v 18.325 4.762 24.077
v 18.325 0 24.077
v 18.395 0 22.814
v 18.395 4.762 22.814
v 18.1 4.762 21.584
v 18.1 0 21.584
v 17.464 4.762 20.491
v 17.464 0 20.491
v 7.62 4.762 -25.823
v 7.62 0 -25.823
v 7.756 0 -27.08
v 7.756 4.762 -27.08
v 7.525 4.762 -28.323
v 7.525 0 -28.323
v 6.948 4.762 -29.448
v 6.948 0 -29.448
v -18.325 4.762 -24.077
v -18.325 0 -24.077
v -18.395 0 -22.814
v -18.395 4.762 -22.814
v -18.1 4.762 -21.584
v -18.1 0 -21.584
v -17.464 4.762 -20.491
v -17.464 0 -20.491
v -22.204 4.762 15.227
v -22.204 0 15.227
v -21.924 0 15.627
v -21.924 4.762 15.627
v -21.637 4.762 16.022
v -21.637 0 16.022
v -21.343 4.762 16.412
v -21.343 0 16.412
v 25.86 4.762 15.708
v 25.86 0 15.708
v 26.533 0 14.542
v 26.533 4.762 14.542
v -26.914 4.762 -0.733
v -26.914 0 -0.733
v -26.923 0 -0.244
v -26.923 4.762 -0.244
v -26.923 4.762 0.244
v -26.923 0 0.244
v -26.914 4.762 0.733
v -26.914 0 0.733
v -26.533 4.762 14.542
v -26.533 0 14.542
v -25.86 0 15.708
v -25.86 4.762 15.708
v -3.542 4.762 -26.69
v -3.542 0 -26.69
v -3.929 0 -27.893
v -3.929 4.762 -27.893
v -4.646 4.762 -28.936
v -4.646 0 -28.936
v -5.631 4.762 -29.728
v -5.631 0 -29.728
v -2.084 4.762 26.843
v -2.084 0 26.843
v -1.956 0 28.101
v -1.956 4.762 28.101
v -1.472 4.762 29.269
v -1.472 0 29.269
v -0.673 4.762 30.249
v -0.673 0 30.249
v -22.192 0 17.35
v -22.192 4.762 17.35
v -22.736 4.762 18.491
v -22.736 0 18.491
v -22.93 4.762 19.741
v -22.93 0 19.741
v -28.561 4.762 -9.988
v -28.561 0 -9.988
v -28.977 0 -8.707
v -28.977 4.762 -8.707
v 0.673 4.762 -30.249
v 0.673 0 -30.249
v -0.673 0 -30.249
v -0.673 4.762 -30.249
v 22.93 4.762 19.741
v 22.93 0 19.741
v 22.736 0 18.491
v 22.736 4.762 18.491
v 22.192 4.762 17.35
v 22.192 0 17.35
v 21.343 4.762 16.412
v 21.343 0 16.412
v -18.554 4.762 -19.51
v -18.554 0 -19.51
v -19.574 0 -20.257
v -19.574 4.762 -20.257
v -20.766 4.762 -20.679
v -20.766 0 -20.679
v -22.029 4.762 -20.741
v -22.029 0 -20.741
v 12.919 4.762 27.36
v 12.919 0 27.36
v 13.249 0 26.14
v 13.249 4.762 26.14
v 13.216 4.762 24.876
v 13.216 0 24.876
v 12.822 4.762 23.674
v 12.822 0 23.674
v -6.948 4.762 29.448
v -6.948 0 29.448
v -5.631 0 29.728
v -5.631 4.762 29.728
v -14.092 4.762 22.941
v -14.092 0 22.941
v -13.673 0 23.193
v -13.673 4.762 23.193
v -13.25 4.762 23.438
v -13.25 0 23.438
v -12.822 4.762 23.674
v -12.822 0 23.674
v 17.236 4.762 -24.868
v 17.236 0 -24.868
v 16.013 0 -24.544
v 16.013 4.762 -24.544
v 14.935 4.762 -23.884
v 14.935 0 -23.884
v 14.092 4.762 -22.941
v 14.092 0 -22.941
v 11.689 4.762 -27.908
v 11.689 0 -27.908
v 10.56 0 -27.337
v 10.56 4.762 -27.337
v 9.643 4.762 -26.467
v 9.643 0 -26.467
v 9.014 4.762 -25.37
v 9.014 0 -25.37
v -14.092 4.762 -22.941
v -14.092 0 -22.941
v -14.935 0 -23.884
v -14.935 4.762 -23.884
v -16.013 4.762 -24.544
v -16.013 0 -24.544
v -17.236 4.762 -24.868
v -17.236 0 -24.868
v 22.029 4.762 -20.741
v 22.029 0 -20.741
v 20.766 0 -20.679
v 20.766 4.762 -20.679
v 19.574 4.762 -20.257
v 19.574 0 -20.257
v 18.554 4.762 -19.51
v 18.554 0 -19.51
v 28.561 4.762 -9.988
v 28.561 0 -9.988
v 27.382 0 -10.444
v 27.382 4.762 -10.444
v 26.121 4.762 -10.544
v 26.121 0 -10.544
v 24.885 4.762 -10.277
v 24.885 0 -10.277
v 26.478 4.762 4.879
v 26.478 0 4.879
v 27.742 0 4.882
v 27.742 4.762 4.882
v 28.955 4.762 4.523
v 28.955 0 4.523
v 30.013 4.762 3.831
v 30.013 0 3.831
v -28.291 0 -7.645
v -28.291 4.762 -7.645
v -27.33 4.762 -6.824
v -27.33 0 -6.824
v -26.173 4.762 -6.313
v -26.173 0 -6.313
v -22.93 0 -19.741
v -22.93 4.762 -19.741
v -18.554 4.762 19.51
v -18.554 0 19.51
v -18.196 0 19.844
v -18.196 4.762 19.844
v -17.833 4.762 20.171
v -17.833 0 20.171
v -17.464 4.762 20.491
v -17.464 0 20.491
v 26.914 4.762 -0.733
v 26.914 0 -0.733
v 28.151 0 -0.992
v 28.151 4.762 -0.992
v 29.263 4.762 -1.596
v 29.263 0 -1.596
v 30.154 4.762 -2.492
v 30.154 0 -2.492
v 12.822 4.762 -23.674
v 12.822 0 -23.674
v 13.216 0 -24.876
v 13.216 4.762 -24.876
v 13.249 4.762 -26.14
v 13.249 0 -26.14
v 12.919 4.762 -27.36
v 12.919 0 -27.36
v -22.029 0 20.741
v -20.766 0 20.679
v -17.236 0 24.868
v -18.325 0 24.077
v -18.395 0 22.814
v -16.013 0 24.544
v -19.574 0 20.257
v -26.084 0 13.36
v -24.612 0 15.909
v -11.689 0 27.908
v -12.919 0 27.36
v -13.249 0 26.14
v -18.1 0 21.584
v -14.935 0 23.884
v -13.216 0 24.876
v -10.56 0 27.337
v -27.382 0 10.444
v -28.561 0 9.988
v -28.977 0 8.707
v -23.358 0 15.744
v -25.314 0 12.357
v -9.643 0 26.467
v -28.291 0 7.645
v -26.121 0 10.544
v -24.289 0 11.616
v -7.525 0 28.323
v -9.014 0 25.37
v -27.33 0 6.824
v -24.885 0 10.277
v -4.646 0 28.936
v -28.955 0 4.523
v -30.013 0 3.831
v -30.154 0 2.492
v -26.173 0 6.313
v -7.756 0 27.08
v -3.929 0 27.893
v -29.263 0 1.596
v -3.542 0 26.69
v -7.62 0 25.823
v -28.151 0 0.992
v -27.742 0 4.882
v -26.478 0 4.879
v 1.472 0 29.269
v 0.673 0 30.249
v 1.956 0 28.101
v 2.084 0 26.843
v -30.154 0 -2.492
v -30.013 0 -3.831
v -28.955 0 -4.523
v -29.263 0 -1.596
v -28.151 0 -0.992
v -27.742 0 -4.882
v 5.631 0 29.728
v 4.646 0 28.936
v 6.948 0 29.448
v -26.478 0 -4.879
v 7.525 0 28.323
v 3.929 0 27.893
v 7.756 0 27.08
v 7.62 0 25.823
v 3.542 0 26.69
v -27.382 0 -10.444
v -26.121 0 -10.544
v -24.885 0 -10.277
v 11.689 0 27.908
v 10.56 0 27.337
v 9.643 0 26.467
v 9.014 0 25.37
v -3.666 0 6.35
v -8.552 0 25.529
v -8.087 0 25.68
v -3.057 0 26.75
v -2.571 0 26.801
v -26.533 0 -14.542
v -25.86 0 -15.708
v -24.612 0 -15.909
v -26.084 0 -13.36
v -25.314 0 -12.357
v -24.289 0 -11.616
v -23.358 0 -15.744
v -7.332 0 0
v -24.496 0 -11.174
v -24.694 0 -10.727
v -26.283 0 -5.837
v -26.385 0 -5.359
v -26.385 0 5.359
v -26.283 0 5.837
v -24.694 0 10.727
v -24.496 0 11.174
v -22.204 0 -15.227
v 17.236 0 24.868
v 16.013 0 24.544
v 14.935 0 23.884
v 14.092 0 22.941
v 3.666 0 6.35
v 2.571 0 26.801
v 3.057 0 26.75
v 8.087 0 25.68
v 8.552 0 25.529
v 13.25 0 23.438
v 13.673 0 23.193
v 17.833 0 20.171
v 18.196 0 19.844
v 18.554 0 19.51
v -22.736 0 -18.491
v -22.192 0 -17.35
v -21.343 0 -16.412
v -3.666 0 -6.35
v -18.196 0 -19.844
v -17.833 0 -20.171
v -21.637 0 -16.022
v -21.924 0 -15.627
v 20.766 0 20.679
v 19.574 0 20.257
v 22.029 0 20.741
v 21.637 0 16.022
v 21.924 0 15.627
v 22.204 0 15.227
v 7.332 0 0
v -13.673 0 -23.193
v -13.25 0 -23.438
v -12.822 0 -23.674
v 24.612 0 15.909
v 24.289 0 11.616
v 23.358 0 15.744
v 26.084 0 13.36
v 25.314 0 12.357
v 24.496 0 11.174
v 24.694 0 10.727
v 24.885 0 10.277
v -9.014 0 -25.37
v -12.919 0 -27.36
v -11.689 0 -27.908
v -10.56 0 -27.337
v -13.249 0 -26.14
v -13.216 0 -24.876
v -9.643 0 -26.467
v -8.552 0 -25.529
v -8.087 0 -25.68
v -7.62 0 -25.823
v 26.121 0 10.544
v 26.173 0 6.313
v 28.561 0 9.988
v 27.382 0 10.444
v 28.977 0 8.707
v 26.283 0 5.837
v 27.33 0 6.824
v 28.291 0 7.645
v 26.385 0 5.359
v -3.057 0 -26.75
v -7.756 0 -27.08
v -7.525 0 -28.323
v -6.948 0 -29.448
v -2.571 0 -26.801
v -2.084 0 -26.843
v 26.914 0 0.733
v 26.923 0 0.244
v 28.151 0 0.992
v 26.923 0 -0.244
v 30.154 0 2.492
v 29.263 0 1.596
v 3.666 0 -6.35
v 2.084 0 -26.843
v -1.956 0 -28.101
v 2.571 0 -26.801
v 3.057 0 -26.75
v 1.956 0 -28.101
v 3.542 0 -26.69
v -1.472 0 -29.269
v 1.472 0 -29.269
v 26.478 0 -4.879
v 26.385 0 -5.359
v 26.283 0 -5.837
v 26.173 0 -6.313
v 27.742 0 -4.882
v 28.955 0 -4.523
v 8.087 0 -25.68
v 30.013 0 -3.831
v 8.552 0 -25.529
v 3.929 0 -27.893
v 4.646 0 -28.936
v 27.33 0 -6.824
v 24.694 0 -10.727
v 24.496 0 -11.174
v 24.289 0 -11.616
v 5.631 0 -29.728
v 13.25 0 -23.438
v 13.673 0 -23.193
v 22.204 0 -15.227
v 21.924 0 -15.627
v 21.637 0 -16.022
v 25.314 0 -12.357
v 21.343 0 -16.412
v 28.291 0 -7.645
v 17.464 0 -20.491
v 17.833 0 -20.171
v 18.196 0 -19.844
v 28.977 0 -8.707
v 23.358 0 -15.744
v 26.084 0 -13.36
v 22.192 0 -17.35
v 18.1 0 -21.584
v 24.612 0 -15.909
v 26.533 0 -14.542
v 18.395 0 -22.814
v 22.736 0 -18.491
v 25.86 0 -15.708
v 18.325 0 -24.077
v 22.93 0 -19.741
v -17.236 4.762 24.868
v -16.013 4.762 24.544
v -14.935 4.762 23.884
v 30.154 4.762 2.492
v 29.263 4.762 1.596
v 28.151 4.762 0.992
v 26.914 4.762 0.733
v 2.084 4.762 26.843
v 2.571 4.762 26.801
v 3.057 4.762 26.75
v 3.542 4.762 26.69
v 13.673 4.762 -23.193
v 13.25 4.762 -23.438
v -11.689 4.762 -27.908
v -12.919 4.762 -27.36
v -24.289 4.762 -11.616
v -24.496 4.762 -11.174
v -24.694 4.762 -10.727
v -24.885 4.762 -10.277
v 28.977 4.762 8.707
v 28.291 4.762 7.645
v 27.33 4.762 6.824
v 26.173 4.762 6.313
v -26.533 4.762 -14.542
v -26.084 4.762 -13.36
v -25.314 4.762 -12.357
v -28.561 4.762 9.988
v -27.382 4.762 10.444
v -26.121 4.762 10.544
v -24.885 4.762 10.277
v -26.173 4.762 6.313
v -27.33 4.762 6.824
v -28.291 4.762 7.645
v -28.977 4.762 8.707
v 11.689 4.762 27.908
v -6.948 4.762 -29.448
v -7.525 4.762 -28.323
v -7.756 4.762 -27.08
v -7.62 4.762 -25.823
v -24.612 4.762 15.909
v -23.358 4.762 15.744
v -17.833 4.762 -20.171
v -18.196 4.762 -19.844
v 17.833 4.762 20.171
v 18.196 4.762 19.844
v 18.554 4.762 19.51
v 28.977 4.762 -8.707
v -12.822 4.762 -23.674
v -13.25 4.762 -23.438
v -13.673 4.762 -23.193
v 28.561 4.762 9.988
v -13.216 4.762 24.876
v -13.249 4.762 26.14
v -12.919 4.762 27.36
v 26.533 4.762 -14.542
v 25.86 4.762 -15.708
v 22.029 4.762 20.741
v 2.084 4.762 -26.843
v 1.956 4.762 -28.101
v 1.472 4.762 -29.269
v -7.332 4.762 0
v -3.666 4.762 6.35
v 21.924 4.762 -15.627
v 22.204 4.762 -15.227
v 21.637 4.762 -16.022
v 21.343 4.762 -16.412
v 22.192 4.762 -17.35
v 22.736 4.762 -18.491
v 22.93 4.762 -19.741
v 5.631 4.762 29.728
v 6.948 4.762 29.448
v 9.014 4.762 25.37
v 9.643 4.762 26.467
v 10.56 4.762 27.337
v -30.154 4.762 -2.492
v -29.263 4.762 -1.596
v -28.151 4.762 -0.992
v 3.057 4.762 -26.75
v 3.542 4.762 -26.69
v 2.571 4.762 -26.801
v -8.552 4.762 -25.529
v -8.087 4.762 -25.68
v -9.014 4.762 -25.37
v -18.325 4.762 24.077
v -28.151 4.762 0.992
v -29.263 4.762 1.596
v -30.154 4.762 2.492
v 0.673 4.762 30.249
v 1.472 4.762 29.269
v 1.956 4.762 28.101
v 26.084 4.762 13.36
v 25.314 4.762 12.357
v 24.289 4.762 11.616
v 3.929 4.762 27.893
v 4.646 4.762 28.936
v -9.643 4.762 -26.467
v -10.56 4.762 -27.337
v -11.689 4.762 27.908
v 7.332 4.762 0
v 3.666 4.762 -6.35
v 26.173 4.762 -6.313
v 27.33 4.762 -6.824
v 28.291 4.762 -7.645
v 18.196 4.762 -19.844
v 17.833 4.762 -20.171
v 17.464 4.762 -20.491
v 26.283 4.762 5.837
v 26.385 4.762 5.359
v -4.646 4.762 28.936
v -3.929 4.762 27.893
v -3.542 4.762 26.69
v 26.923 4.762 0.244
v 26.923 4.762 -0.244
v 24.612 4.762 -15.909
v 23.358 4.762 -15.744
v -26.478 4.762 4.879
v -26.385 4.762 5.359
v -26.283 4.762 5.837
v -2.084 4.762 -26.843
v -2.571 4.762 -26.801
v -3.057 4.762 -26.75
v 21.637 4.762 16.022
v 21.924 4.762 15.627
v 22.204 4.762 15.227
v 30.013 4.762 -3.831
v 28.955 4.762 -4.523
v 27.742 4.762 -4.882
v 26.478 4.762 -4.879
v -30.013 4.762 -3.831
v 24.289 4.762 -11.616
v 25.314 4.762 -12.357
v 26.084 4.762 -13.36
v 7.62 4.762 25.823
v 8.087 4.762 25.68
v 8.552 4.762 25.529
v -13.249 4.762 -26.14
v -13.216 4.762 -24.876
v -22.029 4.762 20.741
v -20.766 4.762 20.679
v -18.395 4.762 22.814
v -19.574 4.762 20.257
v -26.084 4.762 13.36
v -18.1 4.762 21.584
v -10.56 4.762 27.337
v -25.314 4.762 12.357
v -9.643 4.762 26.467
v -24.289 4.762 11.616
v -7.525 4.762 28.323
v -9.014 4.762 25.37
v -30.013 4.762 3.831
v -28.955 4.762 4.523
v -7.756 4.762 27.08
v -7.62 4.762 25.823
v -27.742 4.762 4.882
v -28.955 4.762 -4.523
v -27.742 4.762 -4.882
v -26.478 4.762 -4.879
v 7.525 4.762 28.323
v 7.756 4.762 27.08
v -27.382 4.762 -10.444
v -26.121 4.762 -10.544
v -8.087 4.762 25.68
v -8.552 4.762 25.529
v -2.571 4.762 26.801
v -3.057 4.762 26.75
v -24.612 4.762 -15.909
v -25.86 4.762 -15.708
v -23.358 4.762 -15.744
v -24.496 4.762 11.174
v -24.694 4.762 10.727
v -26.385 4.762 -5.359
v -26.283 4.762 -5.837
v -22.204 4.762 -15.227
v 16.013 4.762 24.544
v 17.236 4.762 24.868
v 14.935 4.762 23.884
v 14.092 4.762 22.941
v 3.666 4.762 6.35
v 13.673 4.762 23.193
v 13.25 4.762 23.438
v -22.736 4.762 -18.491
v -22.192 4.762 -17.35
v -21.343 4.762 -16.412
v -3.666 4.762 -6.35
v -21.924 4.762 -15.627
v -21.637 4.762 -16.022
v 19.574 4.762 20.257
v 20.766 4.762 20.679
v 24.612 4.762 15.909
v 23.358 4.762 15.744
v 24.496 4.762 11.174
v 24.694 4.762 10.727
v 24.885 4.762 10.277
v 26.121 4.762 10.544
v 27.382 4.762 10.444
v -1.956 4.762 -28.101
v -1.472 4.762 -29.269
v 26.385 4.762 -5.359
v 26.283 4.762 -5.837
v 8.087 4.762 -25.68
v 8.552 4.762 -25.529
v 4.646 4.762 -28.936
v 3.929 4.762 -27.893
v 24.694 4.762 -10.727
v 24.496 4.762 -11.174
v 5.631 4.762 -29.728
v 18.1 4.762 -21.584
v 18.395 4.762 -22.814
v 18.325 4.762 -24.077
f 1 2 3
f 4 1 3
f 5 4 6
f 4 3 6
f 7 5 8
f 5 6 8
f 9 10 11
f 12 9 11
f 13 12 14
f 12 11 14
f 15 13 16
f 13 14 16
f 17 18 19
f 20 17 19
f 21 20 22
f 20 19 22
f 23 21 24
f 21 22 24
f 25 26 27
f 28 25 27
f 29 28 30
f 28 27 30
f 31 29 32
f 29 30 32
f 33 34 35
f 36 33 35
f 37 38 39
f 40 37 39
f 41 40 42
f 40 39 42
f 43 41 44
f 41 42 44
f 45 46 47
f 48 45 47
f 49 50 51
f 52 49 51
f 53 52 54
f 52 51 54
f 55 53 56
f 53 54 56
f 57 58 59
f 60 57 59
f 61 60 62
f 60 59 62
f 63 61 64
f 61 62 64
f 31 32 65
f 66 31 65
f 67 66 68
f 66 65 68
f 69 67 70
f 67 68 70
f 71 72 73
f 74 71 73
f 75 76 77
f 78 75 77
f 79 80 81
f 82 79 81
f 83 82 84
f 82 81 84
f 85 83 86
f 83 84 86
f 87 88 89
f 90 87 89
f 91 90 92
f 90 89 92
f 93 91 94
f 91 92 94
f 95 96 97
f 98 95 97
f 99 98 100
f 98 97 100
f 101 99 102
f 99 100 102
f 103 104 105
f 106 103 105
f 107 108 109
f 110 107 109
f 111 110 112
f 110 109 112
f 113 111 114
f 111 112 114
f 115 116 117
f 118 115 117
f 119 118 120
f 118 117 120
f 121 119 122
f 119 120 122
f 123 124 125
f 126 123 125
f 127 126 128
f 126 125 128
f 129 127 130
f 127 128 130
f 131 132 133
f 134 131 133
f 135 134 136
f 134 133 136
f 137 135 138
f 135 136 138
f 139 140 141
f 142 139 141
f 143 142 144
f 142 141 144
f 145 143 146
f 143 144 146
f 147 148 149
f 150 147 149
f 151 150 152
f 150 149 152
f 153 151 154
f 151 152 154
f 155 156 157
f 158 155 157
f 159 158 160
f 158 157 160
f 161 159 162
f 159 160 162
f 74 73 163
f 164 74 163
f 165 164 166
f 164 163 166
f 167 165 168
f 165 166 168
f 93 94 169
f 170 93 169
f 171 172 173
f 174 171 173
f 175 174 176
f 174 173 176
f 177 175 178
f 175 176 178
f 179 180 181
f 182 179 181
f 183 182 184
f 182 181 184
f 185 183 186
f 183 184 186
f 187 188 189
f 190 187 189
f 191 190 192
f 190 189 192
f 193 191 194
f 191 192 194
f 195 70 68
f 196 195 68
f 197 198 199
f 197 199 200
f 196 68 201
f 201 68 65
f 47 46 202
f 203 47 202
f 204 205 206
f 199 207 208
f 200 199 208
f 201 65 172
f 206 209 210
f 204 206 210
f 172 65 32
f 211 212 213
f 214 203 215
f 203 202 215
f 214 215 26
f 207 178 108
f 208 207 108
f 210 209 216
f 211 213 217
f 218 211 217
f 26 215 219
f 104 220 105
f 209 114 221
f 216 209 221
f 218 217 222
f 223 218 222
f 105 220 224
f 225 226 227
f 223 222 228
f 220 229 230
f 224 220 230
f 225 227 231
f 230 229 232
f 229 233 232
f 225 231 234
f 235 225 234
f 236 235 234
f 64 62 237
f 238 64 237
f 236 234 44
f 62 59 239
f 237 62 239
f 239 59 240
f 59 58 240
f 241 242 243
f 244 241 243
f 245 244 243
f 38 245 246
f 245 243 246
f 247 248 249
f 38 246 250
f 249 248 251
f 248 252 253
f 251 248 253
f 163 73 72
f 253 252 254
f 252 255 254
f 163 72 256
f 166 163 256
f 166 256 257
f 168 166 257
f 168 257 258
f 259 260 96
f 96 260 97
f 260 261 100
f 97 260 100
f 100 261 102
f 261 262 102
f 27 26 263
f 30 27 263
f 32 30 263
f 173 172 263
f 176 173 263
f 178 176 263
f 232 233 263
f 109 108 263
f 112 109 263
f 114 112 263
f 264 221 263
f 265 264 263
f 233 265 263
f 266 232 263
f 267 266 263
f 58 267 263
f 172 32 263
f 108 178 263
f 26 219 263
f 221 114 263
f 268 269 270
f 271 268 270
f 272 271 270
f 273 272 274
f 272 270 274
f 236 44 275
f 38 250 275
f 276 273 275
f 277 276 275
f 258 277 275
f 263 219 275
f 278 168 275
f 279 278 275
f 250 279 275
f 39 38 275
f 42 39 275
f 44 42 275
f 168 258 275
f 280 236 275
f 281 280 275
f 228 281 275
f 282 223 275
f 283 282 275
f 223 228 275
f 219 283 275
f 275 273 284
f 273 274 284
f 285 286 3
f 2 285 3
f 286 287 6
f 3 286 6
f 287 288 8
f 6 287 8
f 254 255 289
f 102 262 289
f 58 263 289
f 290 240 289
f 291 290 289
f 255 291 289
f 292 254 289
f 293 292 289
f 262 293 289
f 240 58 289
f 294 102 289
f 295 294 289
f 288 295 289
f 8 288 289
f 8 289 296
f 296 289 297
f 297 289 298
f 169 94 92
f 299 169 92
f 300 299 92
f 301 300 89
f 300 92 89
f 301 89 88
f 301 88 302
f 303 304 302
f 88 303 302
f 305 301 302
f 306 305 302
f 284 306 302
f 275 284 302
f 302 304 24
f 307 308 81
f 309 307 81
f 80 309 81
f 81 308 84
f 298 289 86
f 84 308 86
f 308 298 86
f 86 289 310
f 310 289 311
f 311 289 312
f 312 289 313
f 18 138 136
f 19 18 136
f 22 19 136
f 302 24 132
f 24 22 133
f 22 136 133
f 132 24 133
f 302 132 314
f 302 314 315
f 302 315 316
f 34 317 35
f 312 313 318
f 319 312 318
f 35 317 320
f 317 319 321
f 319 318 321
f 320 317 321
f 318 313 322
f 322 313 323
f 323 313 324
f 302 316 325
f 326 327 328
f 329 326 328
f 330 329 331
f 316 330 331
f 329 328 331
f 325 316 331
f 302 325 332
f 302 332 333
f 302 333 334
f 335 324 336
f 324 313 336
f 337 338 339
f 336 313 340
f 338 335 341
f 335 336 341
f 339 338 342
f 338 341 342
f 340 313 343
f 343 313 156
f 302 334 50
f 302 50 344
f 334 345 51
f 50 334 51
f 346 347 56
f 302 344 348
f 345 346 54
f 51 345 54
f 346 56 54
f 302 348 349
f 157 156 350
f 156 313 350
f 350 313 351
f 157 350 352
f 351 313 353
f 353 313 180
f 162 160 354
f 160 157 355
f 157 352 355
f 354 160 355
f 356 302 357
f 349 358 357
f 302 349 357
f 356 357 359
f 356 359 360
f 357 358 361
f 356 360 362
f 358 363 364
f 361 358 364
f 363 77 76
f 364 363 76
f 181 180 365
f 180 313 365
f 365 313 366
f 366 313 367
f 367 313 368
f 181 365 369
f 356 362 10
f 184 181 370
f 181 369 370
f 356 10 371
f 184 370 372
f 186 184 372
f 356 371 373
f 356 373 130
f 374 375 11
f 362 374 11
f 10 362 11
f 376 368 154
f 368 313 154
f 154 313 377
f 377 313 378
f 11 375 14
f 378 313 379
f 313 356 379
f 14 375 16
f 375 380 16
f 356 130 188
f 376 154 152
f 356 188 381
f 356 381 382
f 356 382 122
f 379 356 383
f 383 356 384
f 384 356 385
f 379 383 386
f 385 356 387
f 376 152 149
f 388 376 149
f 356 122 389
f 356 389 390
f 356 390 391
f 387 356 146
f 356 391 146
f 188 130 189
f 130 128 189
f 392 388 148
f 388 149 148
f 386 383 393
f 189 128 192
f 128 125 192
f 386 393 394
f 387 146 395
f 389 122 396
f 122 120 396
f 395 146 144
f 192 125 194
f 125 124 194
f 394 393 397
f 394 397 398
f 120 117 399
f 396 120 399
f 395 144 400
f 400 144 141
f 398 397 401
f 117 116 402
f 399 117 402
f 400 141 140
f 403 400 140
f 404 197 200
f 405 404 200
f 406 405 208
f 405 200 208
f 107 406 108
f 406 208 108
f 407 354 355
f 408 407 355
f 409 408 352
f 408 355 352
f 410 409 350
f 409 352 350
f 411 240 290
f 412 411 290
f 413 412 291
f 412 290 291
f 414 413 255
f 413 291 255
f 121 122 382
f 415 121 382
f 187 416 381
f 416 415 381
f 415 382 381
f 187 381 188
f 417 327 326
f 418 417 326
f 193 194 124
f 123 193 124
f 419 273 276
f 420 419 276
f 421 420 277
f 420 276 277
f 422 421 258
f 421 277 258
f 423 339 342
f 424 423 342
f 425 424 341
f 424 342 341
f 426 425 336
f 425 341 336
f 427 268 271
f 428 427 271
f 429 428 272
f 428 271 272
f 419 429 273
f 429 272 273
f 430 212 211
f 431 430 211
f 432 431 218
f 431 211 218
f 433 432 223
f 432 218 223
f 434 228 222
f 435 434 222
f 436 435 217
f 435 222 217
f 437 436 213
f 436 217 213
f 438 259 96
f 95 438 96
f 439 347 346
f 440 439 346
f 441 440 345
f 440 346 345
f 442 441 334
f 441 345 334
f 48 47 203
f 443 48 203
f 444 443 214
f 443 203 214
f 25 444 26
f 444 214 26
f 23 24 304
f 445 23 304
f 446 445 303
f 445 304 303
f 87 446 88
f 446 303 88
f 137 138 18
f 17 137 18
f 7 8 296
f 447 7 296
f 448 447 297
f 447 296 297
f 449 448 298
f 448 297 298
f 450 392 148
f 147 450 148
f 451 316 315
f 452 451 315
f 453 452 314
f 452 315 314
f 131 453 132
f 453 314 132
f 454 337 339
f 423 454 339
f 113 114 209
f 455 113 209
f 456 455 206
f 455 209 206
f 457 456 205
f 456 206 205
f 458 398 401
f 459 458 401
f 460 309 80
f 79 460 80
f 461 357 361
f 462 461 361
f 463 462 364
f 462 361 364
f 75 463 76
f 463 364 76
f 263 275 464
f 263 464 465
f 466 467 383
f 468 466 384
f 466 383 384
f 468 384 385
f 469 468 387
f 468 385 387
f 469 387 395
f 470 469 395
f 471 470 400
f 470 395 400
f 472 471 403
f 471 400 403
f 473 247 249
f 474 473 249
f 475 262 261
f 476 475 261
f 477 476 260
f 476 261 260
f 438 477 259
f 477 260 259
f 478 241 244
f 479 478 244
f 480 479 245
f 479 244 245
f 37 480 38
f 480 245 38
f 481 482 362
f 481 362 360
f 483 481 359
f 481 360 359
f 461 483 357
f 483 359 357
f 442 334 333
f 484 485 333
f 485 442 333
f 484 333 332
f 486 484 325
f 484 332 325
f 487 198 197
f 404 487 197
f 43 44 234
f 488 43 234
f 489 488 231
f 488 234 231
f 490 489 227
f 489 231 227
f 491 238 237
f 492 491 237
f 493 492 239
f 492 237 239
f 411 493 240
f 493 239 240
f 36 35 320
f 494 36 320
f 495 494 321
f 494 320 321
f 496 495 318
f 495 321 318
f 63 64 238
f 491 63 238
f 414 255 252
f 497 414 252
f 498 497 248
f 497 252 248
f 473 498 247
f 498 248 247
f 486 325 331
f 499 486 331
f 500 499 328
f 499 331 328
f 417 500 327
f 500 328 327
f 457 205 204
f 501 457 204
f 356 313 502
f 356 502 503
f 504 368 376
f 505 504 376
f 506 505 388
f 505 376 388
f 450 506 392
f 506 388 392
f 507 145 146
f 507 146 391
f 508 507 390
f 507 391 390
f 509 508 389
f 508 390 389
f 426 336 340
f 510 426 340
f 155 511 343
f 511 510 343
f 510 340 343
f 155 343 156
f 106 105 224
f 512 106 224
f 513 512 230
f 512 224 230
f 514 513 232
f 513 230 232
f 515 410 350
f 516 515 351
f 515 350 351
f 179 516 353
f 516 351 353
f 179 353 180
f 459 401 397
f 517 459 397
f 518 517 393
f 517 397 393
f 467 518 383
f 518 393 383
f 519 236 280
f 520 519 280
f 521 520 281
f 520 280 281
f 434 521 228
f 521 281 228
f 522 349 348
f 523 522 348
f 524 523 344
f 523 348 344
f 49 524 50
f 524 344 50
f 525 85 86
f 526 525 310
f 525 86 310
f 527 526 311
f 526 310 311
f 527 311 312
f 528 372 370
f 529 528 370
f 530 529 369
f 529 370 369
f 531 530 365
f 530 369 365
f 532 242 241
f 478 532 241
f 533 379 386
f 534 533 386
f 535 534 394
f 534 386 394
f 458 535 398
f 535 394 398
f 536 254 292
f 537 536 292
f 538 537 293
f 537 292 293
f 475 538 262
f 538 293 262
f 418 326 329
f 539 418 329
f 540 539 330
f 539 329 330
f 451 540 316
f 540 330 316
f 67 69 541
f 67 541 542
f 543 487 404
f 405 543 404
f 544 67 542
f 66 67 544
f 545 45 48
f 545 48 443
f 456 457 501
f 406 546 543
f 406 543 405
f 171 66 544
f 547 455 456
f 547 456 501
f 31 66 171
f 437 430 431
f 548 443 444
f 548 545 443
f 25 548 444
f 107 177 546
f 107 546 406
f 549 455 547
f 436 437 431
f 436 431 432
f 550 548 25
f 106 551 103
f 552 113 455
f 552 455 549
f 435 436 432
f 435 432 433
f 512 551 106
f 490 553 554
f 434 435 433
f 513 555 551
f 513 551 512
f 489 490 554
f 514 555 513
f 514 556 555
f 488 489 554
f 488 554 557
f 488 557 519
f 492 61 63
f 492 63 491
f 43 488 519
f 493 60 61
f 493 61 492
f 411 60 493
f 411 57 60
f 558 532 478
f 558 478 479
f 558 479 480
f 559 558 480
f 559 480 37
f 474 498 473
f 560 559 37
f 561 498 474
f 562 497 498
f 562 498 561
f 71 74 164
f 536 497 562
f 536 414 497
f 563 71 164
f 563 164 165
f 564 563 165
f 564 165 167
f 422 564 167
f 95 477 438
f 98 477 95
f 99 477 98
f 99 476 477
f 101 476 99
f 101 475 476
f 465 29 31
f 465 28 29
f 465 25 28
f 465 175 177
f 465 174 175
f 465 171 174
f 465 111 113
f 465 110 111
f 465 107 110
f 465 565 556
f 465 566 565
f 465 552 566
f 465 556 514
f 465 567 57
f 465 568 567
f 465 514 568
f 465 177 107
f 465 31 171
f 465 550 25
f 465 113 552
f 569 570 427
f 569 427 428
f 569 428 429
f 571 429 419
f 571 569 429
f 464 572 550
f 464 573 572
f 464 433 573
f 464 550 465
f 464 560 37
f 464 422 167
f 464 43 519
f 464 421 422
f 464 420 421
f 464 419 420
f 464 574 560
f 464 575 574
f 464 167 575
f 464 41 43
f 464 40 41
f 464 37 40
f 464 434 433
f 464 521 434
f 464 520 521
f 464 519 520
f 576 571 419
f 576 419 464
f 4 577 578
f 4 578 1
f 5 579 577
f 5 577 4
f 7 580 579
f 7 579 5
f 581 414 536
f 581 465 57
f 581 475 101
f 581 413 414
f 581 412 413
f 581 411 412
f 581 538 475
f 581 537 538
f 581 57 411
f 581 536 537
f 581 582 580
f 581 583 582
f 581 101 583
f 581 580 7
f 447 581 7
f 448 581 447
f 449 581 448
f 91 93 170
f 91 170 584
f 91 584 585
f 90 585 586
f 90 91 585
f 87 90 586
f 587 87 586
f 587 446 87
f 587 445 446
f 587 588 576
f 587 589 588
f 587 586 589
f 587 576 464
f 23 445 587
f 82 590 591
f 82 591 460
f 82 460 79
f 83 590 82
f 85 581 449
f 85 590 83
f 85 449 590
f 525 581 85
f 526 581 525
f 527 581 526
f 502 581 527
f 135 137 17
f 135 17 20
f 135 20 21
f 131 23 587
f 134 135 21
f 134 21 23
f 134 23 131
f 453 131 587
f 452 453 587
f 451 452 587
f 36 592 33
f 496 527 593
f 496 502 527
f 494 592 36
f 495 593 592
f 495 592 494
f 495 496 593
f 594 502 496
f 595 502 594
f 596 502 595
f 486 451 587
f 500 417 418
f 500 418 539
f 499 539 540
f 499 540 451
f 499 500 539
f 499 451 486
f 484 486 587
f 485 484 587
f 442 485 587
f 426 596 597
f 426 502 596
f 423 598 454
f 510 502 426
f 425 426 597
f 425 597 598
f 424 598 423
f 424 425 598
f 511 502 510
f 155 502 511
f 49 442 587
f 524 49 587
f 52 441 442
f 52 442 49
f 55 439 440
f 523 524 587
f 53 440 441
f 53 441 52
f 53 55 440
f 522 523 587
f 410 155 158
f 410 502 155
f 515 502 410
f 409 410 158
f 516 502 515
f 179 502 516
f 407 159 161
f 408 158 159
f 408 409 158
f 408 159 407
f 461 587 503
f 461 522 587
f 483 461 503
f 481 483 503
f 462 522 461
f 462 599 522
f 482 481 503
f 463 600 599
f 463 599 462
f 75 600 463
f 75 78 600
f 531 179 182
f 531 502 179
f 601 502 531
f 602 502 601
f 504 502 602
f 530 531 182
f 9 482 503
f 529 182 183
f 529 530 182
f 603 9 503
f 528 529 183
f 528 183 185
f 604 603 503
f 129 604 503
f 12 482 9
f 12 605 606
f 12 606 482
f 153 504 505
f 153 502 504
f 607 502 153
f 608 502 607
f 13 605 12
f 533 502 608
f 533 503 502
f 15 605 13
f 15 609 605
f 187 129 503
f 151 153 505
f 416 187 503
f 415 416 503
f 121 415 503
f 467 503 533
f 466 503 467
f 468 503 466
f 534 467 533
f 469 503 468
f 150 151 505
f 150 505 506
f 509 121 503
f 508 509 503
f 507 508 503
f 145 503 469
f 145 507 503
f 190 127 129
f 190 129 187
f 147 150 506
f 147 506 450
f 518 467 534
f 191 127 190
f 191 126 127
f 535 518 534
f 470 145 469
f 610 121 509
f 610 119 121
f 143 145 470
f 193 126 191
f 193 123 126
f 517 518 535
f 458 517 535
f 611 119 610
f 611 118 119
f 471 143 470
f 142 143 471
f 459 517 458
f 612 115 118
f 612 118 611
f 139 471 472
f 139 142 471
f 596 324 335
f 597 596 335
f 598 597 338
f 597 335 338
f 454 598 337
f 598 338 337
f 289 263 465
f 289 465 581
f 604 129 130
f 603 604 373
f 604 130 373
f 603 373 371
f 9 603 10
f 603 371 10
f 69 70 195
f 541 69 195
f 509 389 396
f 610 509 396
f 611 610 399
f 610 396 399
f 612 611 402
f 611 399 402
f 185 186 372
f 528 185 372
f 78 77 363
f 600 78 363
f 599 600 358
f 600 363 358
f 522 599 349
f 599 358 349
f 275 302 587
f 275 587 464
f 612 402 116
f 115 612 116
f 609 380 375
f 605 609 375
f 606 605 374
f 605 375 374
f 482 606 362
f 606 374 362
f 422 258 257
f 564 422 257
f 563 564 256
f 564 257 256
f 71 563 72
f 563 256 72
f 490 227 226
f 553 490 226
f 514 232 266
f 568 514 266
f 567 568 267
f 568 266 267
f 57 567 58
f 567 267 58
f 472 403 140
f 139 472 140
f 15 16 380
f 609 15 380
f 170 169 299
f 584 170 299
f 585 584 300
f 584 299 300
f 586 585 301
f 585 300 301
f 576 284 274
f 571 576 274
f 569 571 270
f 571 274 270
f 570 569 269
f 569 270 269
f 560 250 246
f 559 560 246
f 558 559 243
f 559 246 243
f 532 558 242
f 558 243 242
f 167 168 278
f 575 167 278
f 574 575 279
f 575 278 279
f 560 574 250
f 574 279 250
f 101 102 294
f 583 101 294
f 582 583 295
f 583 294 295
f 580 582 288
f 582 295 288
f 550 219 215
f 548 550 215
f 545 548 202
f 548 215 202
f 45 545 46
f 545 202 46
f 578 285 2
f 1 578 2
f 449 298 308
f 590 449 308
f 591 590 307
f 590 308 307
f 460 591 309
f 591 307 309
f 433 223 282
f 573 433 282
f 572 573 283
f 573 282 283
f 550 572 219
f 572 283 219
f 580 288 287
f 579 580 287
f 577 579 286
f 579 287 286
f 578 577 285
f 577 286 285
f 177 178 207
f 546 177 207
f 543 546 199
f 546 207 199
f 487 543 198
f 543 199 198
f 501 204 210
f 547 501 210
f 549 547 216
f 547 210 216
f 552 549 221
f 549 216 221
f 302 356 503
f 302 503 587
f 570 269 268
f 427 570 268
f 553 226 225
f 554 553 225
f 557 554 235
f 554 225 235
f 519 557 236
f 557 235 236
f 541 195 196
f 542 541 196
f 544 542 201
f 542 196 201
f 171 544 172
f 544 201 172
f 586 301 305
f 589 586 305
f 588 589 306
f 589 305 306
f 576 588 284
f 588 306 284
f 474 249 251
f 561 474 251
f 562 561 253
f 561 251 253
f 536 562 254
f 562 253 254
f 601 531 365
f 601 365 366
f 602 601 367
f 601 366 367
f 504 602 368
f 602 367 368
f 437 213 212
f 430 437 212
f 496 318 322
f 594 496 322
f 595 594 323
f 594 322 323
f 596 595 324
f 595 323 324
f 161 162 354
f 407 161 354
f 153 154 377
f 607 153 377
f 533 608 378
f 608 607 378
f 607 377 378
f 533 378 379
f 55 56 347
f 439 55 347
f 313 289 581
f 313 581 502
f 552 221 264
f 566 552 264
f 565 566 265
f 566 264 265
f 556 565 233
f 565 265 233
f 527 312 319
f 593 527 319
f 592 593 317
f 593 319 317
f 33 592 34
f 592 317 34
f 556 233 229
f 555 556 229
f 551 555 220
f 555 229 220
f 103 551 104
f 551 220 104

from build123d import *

# Parameters (mm, degrees)
SKETCH2_R           = 26.923711167
BOSS_EXTRUDE2_DEPTH = 4.7625
BOSS_EXTRUDE3_DEPTH = 4.7625
CIRPATTERN1_COUNT   = 30


with BuildPart() as part:
    # Sketch2 → Boss-Extrude2 (new body)
    with BuildSketch(Plane(origin=(0, 0, 0), x_dir=(1, 0, 0), z_dir=(0, 1, 0))):
        Circle(SKETCH2_R)
        Polygon((7.332348419, 0), (3.666174209, 6.35), (-3.666174209, 6.35), (-7.332348419, 0), (-3.666174209, -6.35), (3.666174209, -6.35), align=None, mode=Mode.SUBTRACT)
    extrude(amount=BOSS_EXTRUDE2_DEPTH)

    # Sketch1 → Boss-Extrude3 (add)
    with BuildSketch(Plane(origin=(0, 0, 0), x_dir=(1, 0, 0), z_dir=(0, 1, 0))):
        with BuildLine():
            Line((0.673251408, 30.249487652), (-0.673251408, 30.249487652))
            ThreePointArc((-0.673251408, 30.249487652), (-1.756386228, 28.702610818), (-2.084301351, 26.842911743))
            ThreePointArc((-2.084301351, 26.842911743), (0, 26.923711167), (2.084301351, 26.842911743))
            ThreePointArc((2.084301351, 26.842911743), (1.756386228, 28.702610818), (0.673251408, 30.249487652))
        make_face()
    boss_extrude3 = extrude(amount=BOSS_EXTRUDE3_DEPTH)

    # CirPattern1: Boss-Extrude3 ×30 about axis
    cirpattern1_axis = Axis((0, 0, 0), (0, 1, 0))
    for i in range(1, CIRPATTERN1_COUNT):
        add(boss_extrude3.rotate(cirpattern1_axis, i * 360 / CIRPATTERN1_COUNT))


solid = part.part
